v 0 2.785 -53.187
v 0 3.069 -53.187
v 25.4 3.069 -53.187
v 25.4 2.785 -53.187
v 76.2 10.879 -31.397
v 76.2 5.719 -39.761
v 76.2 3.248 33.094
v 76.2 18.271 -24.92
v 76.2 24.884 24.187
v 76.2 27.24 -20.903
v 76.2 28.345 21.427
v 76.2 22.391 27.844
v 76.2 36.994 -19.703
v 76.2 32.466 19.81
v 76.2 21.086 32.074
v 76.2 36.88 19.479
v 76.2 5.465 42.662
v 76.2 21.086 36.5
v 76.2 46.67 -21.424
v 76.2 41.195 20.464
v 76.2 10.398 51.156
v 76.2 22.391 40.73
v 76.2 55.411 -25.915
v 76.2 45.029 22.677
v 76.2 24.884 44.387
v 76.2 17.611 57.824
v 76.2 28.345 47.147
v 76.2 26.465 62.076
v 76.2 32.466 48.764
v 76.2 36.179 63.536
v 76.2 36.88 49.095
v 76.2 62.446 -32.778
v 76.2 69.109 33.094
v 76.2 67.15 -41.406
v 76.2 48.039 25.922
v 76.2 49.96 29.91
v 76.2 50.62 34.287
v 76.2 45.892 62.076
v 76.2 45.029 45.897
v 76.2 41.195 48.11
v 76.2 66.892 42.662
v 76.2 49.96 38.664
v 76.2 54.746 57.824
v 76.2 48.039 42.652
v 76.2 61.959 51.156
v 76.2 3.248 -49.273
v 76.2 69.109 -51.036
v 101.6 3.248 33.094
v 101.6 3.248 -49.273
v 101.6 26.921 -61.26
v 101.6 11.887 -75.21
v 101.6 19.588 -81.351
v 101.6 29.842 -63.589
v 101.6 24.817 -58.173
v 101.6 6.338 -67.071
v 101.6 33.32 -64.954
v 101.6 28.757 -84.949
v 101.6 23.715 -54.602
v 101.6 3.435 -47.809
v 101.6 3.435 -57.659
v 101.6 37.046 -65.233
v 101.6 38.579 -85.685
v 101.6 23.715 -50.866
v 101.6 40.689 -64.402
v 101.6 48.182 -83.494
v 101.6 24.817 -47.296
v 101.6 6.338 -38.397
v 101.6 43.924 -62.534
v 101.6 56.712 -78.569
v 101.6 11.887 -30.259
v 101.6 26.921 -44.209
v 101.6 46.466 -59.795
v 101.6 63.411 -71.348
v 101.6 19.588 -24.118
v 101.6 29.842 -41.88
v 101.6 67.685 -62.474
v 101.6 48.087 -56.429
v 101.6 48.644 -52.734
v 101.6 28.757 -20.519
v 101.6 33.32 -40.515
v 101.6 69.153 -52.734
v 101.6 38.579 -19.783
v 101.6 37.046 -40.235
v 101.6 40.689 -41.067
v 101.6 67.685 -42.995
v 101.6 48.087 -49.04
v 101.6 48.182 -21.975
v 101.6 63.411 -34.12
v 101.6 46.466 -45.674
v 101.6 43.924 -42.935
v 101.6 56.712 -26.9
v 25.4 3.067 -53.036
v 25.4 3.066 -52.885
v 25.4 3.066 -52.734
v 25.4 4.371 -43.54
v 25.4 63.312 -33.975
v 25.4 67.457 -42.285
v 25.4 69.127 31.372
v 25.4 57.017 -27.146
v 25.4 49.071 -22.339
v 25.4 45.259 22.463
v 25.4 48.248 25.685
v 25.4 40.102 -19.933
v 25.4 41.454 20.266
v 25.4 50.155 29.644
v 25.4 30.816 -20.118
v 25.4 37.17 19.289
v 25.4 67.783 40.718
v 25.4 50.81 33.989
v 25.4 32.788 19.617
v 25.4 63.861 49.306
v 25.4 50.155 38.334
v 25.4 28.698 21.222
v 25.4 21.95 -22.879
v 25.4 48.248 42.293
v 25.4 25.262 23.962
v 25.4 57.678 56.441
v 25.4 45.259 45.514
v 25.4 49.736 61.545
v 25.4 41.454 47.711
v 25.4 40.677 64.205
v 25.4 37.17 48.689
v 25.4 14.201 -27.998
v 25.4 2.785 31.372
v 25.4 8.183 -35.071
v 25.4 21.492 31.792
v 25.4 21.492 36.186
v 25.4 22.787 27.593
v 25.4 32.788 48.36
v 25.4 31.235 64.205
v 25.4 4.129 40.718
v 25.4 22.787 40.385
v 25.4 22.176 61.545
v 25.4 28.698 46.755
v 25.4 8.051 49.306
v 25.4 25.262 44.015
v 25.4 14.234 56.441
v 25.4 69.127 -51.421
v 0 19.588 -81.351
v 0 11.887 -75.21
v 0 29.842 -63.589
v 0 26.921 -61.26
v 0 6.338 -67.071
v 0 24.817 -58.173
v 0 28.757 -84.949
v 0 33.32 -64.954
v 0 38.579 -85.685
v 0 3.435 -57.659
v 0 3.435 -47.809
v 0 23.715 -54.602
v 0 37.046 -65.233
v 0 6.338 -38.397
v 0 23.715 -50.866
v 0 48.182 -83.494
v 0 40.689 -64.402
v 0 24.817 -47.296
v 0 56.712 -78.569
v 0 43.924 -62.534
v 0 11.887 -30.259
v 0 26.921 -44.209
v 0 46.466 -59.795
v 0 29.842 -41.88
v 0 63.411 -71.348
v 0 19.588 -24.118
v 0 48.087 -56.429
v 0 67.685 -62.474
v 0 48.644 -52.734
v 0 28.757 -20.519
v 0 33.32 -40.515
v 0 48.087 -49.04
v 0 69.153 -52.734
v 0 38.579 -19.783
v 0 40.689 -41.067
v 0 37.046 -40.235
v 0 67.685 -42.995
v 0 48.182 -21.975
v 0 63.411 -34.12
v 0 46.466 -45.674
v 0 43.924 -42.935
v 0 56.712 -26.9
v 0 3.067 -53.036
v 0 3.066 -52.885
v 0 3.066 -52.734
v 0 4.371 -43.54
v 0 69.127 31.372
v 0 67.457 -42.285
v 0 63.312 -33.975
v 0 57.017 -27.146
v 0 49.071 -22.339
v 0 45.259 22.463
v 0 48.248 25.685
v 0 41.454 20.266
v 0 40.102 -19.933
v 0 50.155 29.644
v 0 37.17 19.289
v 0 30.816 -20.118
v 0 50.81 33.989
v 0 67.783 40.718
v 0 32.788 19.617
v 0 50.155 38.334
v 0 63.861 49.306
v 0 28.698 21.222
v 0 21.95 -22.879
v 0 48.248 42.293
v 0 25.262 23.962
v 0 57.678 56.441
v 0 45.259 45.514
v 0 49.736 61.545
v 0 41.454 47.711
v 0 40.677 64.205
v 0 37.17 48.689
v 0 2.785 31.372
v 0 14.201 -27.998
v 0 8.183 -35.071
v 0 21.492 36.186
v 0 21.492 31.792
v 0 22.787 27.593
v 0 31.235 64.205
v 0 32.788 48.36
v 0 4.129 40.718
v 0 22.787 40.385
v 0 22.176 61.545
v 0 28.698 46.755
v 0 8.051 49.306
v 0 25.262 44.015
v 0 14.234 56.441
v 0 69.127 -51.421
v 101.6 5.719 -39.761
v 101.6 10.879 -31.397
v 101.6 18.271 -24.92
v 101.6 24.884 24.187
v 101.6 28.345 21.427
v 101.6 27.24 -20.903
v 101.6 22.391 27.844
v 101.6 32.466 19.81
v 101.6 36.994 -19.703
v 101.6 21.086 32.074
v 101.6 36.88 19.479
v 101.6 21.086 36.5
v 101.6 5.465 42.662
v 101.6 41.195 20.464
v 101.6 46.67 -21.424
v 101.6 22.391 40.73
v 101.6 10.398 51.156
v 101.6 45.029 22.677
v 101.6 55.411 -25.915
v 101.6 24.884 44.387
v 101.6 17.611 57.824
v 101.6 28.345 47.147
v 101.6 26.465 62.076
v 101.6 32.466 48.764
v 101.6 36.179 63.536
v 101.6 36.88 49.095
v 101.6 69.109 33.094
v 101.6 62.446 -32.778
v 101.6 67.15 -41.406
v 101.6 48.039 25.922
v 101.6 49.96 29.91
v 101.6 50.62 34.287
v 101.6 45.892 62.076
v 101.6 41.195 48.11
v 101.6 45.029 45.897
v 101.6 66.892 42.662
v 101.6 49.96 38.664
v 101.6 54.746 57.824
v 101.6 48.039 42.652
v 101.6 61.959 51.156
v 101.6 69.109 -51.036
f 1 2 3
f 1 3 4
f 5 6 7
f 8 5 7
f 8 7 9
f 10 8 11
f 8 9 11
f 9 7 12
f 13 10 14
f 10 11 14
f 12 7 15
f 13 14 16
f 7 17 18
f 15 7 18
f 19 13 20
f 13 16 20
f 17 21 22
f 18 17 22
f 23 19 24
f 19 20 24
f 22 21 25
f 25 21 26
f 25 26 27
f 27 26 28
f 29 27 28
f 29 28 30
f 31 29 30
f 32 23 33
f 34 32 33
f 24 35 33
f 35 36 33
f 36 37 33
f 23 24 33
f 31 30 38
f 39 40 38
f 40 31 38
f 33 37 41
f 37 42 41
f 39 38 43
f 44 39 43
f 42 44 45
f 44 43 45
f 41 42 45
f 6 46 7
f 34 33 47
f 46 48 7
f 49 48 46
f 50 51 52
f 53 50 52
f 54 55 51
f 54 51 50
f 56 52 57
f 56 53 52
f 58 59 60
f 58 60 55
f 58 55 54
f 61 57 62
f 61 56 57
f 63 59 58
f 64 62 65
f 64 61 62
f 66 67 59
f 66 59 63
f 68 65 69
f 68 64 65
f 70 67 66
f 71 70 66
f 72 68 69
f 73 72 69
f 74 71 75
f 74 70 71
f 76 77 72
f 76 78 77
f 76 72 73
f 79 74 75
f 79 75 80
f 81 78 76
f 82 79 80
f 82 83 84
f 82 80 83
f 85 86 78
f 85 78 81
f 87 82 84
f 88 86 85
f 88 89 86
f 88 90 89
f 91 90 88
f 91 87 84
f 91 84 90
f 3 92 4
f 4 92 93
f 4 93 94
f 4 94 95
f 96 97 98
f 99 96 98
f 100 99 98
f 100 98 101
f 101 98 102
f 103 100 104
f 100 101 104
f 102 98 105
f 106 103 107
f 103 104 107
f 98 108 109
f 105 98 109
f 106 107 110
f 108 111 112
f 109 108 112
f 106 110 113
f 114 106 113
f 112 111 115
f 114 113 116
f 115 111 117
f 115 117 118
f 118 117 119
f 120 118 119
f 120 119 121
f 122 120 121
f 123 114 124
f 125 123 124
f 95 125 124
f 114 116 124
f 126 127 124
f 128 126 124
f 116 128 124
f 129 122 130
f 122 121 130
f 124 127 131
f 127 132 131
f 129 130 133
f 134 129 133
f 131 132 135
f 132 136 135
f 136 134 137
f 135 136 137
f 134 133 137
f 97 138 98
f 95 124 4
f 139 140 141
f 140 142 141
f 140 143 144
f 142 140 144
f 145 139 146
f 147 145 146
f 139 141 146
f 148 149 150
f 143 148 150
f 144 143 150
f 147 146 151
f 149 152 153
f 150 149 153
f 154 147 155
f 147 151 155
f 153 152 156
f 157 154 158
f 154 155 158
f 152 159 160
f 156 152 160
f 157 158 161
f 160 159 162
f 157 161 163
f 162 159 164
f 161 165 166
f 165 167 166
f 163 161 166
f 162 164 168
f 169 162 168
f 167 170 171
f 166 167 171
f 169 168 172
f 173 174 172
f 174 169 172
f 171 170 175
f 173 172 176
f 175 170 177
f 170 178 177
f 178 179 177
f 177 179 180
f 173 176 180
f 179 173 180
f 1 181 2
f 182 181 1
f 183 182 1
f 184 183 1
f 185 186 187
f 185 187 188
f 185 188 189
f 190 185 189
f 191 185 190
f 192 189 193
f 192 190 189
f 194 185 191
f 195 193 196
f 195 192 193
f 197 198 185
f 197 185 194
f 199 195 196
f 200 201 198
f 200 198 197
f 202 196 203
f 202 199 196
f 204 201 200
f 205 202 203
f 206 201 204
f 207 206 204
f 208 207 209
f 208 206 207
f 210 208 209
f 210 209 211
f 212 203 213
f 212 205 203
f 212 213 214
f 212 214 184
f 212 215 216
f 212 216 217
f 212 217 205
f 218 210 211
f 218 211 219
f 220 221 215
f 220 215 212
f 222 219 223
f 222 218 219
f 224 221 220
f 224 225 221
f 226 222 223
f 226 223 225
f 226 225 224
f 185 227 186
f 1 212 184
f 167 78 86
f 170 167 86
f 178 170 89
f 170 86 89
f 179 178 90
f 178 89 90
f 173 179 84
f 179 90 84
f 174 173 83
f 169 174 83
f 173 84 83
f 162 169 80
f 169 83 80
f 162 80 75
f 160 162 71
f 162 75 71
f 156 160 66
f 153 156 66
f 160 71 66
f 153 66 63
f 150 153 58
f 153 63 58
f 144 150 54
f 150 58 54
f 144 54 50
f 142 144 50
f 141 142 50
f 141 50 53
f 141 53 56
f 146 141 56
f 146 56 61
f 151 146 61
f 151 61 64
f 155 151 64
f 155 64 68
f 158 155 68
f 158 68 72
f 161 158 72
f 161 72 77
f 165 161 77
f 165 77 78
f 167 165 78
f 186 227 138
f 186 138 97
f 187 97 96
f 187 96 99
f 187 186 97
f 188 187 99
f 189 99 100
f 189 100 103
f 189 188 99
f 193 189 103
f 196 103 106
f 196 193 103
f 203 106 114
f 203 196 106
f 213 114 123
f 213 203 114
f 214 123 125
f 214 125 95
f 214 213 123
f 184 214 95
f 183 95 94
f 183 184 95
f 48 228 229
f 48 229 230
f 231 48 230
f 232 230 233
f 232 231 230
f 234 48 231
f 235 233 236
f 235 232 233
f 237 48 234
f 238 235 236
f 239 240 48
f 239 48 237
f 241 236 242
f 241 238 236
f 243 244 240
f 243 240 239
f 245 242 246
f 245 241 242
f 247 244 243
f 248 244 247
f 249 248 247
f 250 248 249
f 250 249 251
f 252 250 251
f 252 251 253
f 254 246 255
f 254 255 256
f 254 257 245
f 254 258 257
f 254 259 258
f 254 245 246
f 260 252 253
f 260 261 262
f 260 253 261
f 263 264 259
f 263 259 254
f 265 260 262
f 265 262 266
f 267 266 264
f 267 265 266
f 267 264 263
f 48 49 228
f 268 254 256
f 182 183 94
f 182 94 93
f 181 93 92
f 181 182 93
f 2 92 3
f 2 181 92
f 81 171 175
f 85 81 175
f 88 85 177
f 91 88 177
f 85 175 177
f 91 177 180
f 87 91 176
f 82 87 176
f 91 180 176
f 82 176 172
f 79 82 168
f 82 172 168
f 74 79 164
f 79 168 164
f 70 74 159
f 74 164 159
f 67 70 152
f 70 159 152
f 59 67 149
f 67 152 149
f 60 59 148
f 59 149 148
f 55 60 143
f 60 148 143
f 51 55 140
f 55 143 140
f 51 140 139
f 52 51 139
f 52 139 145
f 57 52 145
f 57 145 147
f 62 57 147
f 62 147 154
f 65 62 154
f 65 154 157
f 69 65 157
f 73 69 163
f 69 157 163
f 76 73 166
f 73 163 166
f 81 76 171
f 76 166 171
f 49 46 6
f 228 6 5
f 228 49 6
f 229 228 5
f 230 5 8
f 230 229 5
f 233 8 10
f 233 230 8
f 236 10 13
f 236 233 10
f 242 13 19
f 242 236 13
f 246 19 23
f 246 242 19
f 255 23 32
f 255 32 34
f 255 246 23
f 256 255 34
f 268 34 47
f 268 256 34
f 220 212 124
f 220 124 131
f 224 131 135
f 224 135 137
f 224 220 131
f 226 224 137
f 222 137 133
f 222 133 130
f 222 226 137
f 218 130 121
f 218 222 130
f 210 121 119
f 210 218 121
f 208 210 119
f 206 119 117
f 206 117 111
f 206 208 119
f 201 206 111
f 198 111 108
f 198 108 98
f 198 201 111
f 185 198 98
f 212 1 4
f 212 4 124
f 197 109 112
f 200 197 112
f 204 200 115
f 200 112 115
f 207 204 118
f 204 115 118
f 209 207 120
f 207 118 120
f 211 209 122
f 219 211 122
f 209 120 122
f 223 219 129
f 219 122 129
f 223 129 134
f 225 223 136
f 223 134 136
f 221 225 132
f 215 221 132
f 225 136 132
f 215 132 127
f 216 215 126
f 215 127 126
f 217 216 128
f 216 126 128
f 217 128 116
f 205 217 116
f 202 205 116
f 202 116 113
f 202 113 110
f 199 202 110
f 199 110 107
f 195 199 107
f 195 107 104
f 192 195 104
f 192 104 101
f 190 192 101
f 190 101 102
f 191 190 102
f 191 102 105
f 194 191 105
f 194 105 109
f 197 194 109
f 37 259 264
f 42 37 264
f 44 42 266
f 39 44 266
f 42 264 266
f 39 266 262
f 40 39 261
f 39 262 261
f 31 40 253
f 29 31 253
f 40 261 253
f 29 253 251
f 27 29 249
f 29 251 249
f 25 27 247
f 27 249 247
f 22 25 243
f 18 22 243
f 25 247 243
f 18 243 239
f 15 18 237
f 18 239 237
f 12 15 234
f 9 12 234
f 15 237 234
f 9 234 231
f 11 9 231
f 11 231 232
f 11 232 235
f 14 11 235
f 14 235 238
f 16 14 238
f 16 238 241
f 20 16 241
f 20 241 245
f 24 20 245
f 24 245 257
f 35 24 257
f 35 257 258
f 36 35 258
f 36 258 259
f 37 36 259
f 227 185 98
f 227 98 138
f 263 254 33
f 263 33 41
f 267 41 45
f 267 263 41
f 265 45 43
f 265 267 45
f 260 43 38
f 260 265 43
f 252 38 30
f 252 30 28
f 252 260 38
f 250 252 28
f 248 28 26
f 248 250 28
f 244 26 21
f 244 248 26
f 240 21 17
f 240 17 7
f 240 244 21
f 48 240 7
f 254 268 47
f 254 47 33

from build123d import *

# Parameters (mm, degrees)
F0_R      = 33.0434971647
F1_DEPTH  = 101.6
F3_DEPTH  = 25.4
F5_DEPTH  = 25.4
F6_R      = 12.5341082291
F7_DEPTH  = 101.601
F8_R      = 14.8496427524
F9_DEPTH  = 116.84
F10_R     = 14.7413346392
F11_DEPTH = 25.401


with BuildPart() as f1:
    # F0 (on Right) → F1 (new body)
    with BuildSketch(Plane.YZ):
        with Locations((36.1094623804, -52.7343675494)):
            Circle(F0_R)
    extrude(amount=F1_DEPTH)

    # F6 (on face) → F7 (cut, through all)
    with BuildSketch(Plane.YZ.offset(101.6)):
        with Locations((36.1094623804, -52.7343675494)):
            Circle(F6_R)
    extrude(amount=-F7_DEPTH, mode=Mode.SUBTRACT)


with BuildPart() as f3:
    # F2 (on face) → F3 (new body)
    with BuildSketch(Plane(origin=(0, 0, 0), x_dir=(0, -1, 0), z_dir=(-1, 0, 0))):
        with BuildLine():
            Line((-2.7853250504, 31.3722863793), (-69.1268369555, 31.3722863793))
            Line((-69.1268369555, 31.3722863793), (-69.1268369555, -51.4207157537))
            ThreePointArc((-69.1268369555, -51.4207157537), (-35.4525066303, -19.6974016776), (-3.0659652157, -52.7343675494))
            ThreePointArc((-3.0659652157, -52.7343675494), (-3.0667415352, -52.9608714523), (-3.0690704571, -53.1873647124))
            Line((-3.0690704571, -53.1873647124), (-2.7853250504, -53.1873647124))
            Line((-2.7853250504, -53.1873647124), (-2.7853250504, 31.3722863793))
        make_face()
        with BuildLine():
            ThreePointArc((-2.7853250504, 31.3722863793), (-35.956081003, 64.5430423319), (-69.1268369555, 31.3722863793))
            Line((-69.1268369555, 31.3722863793), (-2.7853250504, 31.3722863793))
        make_face()
    extrude(amount=-F3_DEPTH)

    # F10 (on face) → F11 (cut, through all)
    with BuildSketch(Plane.YZ.offset(25.4)):
        with Locations((36.0683202744, 33.9886806905)):
            Circle(F10_R)
    extrude(amount=-F11_DEPTH, mode=Mode.SUBTRACT)


with BuildPart() as f5:
    # F4 (on face) → F5 (new body)
    with BuildSketch(Plane.YZ.offset(101.6)):
        with BuildLine():
            ThreePointArc((69.1093092744, 33.0935716629), (36.1785469789, 63.5364929431), (3.2477846835, 33.0935716629))
            Line((3.2477846835, 33.0935716629), (69.1093092744, 33.0935716629))
        make_face()
        with BuildLine():
            Line((69.1093092744, 33.0935716629), (3.2477846835, 33.0935716629))
            Line((3.2477846835, 33.0935716629), (3.2477846835, -49.2727431015))
            ThreePointArc((3.2477846835, -49.2727431015), (36.9940344992, -19.7027124737), (69.1093092744, -51.0364836171))
            Line((69.1093092744, -51.0364836171), (69.1093092744, 33.0935716629))
        make_face()
    extrude(amount=-F5_DEPTH)

    # F8 (on face) → F9 (cut)
    with BuildSketch(Plane.YZ.offset(101.6)):
        with Locations((35.7699505985, 34.2870503664)):
            Circle(F8_R)
    extrude(amount=-F9_DEPTH, mode=Mode.SUBTRACT)


solid = Compound([f1.part, f3.part, f5.part])
